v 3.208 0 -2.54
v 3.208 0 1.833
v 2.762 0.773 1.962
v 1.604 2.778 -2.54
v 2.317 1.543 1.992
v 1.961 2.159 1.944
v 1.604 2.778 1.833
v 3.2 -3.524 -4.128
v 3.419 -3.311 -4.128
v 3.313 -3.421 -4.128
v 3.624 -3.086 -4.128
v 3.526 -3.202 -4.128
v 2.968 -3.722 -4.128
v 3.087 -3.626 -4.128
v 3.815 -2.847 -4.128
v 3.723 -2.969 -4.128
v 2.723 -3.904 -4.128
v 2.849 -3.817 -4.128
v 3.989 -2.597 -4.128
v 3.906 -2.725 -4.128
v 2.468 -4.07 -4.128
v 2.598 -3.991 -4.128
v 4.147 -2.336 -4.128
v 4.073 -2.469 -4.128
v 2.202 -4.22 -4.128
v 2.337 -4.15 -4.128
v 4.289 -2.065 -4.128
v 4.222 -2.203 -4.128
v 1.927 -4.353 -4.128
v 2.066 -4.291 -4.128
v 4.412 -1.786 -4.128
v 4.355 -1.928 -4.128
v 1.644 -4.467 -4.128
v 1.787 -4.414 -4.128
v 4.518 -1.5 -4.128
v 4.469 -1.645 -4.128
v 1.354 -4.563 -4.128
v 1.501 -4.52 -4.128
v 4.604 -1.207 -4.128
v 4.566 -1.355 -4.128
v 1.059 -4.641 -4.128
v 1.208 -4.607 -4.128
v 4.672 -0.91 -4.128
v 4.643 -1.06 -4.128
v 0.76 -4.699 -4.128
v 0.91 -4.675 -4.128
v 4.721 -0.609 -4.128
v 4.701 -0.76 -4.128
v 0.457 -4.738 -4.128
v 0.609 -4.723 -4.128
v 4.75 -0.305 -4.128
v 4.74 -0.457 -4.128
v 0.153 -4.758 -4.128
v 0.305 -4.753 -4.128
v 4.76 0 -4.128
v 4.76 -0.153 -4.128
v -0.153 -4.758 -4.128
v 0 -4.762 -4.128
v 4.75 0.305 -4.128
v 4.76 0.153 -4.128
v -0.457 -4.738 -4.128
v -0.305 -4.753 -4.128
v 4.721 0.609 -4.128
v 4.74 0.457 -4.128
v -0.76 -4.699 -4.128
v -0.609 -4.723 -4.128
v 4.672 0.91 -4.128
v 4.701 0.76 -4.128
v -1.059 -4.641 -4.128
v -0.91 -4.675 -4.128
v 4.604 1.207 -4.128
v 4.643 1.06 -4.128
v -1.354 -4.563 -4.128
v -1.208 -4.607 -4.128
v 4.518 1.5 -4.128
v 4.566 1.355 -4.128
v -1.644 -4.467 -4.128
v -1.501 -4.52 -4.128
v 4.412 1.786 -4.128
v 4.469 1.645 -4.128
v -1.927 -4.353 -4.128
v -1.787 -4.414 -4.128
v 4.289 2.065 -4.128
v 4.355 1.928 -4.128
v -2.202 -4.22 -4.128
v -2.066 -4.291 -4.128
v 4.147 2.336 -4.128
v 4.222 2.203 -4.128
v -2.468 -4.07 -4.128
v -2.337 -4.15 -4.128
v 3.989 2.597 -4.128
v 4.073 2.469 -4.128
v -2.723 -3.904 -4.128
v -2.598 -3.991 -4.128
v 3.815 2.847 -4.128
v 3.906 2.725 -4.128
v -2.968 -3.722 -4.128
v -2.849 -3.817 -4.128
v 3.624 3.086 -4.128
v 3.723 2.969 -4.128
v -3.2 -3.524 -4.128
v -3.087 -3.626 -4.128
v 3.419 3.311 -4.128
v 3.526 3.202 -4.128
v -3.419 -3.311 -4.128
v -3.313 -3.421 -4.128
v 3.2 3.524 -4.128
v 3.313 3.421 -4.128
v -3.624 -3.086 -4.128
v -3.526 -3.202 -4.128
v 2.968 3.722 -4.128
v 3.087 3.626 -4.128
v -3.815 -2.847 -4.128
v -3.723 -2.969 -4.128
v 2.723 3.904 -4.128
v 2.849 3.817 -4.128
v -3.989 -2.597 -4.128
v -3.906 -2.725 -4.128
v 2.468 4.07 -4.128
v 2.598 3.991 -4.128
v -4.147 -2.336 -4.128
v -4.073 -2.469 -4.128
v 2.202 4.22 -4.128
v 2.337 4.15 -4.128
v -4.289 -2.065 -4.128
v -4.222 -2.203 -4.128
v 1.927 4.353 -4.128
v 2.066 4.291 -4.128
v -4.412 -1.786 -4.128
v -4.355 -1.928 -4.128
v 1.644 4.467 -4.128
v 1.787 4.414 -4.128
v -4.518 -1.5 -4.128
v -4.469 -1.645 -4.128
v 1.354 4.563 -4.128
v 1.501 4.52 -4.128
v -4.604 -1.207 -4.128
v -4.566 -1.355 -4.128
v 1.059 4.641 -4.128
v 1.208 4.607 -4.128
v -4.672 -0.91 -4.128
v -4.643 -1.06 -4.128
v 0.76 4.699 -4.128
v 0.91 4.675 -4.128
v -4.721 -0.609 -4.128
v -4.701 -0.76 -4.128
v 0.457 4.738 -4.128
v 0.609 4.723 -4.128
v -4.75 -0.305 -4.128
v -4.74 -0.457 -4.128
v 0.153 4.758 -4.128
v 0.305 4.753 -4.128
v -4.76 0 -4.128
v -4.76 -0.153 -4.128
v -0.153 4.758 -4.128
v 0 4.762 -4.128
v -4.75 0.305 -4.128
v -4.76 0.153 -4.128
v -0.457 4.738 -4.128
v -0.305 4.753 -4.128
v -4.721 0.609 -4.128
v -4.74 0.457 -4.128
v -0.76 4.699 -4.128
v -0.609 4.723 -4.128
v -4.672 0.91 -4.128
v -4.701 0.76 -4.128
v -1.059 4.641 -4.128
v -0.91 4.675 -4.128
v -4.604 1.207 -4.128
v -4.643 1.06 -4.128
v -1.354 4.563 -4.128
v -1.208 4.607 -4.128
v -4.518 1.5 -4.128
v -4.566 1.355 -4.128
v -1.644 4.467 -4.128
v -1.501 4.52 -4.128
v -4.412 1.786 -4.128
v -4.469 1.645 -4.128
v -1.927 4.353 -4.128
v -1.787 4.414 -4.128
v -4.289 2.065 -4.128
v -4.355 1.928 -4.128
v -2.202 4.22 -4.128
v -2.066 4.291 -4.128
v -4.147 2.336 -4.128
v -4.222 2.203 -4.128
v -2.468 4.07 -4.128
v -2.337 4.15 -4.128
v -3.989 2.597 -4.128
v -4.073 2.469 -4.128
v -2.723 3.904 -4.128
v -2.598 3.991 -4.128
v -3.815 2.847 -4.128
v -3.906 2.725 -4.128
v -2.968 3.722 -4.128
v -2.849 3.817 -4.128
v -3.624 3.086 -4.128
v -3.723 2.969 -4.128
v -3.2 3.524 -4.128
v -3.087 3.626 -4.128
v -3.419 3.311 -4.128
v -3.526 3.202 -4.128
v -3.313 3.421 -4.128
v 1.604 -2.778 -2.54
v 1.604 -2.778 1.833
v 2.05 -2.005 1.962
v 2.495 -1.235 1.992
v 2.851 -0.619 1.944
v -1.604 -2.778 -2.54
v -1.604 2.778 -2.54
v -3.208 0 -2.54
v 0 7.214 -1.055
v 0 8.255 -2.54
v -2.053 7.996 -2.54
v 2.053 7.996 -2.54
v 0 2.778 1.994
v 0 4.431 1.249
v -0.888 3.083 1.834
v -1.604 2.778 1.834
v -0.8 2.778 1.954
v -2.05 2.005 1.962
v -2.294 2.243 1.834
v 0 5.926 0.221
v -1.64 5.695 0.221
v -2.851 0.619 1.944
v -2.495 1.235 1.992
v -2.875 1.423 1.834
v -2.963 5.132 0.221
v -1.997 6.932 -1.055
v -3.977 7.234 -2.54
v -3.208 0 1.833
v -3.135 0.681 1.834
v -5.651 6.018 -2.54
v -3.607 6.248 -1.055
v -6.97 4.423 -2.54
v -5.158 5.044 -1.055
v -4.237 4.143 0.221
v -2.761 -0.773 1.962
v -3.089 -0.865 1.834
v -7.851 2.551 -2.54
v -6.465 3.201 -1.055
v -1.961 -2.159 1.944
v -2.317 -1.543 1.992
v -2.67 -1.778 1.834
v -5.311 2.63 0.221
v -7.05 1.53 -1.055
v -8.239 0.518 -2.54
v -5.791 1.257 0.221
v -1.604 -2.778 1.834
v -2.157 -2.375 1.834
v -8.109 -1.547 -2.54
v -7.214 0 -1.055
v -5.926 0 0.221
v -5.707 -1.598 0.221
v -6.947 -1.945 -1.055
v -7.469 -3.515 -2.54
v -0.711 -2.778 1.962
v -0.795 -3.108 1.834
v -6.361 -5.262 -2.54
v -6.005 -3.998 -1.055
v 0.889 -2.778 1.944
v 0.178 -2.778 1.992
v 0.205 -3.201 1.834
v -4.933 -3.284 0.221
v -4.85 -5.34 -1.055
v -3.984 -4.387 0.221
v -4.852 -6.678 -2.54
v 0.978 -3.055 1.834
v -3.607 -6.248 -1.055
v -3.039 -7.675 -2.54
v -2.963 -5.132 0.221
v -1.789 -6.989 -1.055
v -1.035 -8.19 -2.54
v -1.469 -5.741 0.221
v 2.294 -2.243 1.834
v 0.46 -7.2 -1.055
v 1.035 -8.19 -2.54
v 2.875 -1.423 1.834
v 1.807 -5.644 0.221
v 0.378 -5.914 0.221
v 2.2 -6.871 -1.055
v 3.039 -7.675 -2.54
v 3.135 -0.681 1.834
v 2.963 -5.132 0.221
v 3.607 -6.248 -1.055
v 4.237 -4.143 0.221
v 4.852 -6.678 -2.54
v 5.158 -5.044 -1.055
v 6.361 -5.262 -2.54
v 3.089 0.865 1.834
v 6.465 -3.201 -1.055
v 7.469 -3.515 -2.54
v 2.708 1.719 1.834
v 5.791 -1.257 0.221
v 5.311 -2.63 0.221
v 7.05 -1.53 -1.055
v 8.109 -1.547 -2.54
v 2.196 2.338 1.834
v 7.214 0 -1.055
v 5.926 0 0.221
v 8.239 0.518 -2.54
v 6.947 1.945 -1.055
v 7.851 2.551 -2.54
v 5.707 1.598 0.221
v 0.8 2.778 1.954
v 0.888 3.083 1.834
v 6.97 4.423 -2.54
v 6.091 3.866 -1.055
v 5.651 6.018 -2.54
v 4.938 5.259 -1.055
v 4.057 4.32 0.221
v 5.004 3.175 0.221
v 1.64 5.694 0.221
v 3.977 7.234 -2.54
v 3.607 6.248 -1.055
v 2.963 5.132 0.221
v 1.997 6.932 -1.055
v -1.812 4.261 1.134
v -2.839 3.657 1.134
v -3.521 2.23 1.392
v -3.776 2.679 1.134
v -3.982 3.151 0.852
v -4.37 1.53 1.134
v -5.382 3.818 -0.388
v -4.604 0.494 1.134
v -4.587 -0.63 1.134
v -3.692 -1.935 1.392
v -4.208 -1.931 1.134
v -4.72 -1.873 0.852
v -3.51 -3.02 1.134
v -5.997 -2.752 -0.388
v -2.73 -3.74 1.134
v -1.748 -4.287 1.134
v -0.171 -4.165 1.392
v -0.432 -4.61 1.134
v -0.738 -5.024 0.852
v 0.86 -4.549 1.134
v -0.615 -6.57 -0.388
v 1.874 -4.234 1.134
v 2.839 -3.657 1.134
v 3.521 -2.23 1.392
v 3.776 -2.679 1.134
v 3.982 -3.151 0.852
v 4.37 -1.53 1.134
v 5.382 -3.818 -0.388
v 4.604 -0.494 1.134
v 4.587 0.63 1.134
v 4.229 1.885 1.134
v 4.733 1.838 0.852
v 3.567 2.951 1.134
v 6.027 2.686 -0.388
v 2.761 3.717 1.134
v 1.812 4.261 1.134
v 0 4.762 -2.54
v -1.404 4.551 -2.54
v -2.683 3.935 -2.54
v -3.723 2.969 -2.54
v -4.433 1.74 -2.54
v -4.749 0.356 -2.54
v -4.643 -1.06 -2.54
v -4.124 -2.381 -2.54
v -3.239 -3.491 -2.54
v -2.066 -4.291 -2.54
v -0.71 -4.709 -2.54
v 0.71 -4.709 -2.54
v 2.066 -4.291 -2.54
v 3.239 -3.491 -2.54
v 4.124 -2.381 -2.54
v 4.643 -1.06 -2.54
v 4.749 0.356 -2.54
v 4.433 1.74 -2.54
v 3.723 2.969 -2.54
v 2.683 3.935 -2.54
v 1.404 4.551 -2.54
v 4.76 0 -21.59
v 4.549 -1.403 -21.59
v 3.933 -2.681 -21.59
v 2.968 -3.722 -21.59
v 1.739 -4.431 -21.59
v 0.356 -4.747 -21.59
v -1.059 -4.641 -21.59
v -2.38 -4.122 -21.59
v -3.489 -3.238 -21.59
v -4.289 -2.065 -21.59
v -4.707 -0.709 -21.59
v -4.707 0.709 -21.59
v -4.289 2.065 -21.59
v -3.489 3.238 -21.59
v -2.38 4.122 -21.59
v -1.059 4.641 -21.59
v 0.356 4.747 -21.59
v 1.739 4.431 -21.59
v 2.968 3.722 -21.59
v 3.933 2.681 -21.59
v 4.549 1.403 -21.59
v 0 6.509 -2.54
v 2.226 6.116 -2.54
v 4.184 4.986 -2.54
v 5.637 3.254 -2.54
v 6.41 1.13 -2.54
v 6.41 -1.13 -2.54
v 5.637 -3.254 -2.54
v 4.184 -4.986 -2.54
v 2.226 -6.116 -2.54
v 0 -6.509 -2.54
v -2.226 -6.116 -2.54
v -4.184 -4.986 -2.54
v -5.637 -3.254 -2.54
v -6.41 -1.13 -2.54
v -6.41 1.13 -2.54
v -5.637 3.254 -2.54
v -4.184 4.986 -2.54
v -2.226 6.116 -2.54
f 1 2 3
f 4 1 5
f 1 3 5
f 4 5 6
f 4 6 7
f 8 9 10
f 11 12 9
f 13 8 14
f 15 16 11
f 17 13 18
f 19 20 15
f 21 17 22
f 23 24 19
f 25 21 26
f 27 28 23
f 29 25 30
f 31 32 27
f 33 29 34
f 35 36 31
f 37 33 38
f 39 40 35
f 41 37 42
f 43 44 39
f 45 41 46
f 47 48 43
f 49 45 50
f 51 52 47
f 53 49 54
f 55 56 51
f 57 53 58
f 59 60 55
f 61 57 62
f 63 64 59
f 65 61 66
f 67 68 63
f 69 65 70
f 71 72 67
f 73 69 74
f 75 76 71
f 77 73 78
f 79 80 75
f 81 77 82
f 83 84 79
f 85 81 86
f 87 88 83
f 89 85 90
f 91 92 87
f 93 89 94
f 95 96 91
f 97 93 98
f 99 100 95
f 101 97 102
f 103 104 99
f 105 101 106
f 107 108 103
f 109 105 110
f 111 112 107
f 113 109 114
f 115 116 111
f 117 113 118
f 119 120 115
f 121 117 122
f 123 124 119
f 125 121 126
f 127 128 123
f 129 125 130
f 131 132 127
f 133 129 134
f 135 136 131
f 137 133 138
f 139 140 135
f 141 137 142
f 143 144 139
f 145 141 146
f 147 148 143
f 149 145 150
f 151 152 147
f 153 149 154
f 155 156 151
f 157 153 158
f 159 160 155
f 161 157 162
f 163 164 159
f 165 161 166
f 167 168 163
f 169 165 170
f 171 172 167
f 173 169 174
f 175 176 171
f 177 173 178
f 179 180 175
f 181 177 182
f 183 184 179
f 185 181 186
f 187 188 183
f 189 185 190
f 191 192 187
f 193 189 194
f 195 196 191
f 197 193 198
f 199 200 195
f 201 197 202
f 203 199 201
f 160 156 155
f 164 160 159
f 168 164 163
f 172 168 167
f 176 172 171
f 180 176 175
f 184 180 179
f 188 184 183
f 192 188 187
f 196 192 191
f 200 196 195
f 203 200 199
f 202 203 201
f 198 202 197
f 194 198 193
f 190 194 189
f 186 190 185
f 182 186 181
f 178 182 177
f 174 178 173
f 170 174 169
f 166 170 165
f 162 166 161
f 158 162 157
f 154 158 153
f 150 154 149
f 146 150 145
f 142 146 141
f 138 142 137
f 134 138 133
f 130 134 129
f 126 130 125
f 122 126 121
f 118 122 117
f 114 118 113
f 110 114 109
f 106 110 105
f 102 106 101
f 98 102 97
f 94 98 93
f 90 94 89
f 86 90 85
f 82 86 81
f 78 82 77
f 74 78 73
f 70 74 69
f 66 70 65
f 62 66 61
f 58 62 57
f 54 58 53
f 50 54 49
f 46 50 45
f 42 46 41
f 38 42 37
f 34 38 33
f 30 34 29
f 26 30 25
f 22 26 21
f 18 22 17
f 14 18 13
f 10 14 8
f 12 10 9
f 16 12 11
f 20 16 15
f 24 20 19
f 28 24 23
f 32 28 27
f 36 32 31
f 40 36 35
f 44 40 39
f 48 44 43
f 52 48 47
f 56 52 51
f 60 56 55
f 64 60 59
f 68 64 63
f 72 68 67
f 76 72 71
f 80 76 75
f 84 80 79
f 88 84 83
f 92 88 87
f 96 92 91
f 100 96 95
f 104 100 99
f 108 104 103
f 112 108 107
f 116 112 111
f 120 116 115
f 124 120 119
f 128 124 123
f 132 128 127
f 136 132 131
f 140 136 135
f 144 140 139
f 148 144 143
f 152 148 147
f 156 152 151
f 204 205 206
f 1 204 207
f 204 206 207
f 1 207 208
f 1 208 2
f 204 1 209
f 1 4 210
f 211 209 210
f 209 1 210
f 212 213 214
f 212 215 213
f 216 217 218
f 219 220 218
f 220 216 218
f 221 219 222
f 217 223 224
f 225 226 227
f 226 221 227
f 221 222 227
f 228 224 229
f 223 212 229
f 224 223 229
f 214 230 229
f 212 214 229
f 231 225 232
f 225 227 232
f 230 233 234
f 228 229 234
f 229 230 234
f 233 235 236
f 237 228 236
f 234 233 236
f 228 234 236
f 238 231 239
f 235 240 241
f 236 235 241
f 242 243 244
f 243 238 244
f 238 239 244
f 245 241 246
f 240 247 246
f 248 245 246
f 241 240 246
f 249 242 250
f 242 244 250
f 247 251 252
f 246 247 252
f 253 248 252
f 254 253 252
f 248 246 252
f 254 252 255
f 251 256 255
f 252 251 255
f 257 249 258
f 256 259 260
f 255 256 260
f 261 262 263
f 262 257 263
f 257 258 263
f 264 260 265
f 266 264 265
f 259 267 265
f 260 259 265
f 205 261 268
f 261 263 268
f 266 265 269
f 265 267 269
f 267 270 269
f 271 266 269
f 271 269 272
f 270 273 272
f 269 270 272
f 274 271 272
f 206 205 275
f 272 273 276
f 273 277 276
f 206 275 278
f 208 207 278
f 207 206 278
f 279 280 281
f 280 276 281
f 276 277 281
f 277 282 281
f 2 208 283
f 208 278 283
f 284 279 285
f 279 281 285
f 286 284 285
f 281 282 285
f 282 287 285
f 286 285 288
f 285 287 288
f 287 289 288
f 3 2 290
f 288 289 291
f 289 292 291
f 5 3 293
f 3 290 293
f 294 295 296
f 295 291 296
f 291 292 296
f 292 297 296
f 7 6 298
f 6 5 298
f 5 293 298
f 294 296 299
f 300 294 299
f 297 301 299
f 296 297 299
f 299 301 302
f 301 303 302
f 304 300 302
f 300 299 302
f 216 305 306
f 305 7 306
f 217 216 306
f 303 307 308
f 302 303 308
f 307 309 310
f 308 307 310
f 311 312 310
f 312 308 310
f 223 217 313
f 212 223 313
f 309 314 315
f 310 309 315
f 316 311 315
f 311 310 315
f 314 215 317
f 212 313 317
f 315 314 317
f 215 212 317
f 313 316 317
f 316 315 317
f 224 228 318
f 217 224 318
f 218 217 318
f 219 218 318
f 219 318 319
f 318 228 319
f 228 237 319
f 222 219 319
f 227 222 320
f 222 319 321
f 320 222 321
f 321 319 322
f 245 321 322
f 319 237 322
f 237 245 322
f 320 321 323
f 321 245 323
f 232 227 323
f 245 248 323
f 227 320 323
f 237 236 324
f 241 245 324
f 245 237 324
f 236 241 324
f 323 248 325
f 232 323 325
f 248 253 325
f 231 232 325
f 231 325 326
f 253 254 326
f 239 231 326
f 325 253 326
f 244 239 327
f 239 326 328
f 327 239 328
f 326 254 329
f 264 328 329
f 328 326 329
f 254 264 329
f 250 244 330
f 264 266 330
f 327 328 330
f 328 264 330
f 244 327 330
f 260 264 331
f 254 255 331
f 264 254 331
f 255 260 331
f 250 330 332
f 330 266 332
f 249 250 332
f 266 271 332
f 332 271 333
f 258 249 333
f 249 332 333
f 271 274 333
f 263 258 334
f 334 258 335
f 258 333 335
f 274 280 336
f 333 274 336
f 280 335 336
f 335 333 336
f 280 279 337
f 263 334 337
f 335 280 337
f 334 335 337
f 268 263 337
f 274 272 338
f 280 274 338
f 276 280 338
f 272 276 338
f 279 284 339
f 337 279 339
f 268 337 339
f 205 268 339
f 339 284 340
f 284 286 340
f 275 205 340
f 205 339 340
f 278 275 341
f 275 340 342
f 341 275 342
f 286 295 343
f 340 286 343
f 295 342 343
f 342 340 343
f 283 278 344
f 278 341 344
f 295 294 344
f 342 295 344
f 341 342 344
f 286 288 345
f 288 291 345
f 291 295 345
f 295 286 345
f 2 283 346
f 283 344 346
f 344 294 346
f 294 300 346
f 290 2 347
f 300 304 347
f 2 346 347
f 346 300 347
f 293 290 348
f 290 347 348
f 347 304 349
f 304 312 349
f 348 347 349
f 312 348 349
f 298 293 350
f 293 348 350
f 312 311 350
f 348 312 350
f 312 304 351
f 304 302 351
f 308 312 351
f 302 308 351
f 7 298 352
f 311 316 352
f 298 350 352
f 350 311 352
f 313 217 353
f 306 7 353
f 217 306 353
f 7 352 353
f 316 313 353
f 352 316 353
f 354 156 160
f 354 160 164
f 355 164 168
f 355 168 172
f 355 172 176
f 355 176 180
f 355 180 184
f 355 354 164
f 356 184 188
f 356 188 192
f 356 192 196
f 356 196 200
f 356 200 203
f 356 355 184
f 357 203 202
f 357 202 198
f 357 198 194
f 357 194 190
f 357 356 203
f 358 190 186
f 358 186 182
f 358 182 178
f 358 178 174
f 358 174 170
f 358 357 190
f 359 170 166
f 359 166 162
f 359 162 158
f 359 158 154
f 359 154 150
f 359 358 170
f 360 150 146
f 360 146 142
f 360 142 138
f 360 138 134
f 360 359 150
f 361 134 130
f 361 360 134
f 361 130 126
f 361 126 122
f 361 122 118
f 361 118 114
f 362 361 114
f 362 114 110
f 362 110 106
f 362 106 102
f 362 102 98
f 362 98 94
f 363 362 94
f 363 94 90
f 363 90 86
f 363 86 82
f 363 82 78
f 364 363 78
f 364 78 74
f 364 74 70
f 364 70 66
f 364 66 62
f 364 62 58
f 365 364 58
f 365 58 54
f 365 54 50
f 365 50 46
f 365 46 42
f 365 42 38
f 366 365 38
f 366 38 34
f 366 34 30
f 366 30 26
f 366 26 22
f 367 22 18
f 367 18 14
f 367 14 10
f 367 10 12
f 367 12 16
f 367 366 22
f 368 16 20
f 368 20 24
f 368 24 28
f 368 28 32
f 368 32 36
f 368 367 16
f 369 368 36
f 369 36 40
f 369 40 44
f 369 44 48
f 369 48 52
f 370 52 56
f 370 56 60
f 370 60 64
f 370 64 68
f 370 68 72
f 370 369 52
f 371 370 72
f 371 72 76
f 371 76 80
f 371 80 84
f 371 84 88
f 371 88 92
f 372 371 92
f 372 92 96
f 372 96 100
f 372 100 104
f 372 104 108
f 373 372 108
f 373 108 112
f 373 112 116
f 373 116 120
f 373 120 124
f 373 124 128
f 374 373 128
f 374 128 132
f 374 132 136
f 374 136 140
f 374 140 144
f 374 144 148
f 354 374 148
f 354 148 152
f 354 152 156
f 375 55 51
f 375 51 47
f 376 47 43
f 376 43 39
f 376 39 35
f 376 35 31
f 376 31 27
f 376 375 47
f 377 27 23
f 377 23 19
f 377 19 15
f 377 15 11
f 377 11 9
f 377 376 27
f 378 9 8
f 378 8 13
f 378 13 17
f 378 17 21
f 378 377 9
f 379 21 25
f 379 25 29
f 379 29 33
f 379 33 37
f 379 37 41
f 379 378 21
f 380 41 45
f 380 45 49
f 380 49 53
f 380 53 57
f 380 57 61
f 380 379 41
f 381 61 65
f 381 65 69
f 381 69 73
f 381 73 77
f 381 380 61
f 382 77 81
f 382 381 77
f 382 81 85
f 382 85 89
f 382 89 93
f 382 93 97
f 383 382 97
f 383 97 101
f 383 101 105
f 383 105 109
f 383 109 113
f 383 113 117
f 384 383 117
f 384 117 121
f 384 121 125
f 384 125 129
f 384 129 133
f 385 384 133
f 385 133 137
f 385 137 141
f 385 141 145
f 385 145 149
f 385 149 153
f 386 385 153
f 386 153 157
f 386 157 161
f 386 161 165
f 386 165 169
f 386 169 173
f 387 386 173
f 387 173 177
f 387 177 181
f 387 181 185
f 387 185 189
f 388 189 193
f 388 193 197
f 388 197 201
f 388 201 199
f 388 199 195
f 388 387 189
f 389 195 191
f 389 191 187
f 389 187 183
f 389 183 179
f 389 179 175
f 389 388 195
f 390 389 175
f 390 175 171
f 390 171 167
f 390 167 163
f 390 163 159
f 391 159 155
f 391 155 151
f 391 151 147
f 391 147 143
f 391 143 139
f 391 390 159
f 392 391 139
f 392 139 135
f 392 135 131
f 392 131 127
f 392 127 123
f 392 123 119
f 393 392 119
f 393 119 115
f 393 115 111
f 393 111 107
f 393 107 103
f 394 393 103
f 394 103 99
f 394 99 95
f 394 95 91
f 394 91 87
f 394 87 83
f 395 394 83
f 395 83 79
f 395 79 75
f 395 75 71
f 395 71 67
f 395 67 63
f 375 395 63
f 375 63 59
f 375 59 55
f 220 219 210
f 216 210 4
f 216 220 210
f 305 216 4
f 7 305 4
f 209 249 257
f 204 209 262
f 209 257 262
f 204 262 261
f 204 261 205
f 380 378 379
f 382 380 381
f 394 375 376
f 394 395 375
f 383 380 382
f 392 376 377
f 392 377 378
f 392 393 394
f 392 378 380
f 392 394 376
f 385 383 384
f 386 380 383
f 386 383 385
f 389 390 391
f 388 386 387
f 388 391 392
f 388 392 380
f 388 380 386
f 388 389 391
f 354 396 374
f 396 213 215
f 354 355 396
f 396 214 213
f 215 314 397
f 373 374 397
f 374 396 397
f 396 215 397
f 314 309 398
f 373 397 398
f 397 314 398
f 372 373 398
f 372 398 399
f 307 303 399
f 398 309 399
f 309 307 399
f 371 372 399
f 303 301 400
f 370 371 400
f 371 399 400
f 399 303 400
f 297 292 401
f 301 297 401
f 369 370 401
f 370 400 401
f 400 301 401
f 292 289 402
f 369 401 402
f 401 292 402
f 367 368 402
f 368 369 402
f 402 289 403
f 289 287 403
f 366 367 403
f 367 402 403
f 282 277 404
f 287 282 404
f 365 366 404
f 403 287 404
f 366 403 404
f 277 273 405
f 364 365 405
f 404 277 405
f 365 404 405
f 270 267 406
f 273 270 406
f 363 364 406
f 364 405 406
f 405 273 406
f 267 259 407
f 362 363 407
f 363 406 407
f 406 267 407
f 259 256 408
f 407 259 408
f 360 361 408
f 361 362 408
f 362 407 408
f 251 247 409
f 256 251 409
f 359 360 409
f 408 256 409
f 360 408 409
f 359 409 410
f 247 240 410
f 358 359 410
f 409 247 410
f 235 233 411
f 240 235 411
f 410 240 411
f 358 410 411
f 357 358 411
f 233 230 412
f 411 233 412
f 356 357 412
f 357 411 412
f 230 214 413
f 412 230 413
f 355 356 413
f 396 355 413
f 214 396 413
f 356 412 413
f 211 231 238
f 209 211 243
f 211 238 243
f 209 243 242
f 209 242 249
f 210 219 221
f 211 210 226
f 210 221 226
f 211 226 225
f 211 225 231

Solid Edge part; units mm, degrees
sketch "Sketch1" plane through (0, 0, 0) normal (1, 0, 0) x (0, 1, 0)
  line L0 (0, -2.54) -> (0, 2.54)
  arc A0 (0, 2.54) -> (8.255, -2.54) centre (-0.5525, -7.605) cw
  line L1 (0, -2.54) -> (8.255, -2.54)
  dimension "D1" = 5.08
  dimension "D2" = 10.16
revolve "RevolvedProtrusion1" add sketch "Sketch1" angle 360 about axis through (0, 0, -14.7796) along (0, 0, 1)
sketch "Sketch2" plane through (0, 0, -2.54) normal (0, 0, -1) x (0, 1, 0)
  circle A0 centre (0, 0) radius 4.7625
  dimension "D1" = 9.525
extrude "Protrusion1" add sketch "Sketch2" along normal blind 19.05
sketch "Sketch3" plane through (0, 0, -21.59) normal (0, 0, -1) x (1, 0, 0)
  circle A0 centre (0, 0) radius 4.76
  dimension "D1" = 0.0025
extrude "Cutout1" cut sketch "Sketch3" against normal blind 17.4625 flip side to cut
sketch "Sketch4" plane through (-0.6032, 0.3606, 5.08) normal (0, 0, 1) x (1, 0, 0)
  line L0 (-1.0007, 2.4175) -> (2.2072, 2.4175)
  line L1 (3.8111, -0.3606) -> (2.2072, 2.4175)
  line L2 (2.2072, -3.1387) -> (3.8111, -0.3606)
  line L3 (-1.0007, -3.1387) -> (2.2072, -3.1387)
  line L4 (-2.6047, -0.3606) -> (-1.0007, -3.1387)
  line L5 (-1.0007, 2.4175) -> (-2.6047, -0.3606)
extrude "ExtrudedCutout_11" cut sketch "Sketch4" against normal blind 7.62
properties part number "163737"
